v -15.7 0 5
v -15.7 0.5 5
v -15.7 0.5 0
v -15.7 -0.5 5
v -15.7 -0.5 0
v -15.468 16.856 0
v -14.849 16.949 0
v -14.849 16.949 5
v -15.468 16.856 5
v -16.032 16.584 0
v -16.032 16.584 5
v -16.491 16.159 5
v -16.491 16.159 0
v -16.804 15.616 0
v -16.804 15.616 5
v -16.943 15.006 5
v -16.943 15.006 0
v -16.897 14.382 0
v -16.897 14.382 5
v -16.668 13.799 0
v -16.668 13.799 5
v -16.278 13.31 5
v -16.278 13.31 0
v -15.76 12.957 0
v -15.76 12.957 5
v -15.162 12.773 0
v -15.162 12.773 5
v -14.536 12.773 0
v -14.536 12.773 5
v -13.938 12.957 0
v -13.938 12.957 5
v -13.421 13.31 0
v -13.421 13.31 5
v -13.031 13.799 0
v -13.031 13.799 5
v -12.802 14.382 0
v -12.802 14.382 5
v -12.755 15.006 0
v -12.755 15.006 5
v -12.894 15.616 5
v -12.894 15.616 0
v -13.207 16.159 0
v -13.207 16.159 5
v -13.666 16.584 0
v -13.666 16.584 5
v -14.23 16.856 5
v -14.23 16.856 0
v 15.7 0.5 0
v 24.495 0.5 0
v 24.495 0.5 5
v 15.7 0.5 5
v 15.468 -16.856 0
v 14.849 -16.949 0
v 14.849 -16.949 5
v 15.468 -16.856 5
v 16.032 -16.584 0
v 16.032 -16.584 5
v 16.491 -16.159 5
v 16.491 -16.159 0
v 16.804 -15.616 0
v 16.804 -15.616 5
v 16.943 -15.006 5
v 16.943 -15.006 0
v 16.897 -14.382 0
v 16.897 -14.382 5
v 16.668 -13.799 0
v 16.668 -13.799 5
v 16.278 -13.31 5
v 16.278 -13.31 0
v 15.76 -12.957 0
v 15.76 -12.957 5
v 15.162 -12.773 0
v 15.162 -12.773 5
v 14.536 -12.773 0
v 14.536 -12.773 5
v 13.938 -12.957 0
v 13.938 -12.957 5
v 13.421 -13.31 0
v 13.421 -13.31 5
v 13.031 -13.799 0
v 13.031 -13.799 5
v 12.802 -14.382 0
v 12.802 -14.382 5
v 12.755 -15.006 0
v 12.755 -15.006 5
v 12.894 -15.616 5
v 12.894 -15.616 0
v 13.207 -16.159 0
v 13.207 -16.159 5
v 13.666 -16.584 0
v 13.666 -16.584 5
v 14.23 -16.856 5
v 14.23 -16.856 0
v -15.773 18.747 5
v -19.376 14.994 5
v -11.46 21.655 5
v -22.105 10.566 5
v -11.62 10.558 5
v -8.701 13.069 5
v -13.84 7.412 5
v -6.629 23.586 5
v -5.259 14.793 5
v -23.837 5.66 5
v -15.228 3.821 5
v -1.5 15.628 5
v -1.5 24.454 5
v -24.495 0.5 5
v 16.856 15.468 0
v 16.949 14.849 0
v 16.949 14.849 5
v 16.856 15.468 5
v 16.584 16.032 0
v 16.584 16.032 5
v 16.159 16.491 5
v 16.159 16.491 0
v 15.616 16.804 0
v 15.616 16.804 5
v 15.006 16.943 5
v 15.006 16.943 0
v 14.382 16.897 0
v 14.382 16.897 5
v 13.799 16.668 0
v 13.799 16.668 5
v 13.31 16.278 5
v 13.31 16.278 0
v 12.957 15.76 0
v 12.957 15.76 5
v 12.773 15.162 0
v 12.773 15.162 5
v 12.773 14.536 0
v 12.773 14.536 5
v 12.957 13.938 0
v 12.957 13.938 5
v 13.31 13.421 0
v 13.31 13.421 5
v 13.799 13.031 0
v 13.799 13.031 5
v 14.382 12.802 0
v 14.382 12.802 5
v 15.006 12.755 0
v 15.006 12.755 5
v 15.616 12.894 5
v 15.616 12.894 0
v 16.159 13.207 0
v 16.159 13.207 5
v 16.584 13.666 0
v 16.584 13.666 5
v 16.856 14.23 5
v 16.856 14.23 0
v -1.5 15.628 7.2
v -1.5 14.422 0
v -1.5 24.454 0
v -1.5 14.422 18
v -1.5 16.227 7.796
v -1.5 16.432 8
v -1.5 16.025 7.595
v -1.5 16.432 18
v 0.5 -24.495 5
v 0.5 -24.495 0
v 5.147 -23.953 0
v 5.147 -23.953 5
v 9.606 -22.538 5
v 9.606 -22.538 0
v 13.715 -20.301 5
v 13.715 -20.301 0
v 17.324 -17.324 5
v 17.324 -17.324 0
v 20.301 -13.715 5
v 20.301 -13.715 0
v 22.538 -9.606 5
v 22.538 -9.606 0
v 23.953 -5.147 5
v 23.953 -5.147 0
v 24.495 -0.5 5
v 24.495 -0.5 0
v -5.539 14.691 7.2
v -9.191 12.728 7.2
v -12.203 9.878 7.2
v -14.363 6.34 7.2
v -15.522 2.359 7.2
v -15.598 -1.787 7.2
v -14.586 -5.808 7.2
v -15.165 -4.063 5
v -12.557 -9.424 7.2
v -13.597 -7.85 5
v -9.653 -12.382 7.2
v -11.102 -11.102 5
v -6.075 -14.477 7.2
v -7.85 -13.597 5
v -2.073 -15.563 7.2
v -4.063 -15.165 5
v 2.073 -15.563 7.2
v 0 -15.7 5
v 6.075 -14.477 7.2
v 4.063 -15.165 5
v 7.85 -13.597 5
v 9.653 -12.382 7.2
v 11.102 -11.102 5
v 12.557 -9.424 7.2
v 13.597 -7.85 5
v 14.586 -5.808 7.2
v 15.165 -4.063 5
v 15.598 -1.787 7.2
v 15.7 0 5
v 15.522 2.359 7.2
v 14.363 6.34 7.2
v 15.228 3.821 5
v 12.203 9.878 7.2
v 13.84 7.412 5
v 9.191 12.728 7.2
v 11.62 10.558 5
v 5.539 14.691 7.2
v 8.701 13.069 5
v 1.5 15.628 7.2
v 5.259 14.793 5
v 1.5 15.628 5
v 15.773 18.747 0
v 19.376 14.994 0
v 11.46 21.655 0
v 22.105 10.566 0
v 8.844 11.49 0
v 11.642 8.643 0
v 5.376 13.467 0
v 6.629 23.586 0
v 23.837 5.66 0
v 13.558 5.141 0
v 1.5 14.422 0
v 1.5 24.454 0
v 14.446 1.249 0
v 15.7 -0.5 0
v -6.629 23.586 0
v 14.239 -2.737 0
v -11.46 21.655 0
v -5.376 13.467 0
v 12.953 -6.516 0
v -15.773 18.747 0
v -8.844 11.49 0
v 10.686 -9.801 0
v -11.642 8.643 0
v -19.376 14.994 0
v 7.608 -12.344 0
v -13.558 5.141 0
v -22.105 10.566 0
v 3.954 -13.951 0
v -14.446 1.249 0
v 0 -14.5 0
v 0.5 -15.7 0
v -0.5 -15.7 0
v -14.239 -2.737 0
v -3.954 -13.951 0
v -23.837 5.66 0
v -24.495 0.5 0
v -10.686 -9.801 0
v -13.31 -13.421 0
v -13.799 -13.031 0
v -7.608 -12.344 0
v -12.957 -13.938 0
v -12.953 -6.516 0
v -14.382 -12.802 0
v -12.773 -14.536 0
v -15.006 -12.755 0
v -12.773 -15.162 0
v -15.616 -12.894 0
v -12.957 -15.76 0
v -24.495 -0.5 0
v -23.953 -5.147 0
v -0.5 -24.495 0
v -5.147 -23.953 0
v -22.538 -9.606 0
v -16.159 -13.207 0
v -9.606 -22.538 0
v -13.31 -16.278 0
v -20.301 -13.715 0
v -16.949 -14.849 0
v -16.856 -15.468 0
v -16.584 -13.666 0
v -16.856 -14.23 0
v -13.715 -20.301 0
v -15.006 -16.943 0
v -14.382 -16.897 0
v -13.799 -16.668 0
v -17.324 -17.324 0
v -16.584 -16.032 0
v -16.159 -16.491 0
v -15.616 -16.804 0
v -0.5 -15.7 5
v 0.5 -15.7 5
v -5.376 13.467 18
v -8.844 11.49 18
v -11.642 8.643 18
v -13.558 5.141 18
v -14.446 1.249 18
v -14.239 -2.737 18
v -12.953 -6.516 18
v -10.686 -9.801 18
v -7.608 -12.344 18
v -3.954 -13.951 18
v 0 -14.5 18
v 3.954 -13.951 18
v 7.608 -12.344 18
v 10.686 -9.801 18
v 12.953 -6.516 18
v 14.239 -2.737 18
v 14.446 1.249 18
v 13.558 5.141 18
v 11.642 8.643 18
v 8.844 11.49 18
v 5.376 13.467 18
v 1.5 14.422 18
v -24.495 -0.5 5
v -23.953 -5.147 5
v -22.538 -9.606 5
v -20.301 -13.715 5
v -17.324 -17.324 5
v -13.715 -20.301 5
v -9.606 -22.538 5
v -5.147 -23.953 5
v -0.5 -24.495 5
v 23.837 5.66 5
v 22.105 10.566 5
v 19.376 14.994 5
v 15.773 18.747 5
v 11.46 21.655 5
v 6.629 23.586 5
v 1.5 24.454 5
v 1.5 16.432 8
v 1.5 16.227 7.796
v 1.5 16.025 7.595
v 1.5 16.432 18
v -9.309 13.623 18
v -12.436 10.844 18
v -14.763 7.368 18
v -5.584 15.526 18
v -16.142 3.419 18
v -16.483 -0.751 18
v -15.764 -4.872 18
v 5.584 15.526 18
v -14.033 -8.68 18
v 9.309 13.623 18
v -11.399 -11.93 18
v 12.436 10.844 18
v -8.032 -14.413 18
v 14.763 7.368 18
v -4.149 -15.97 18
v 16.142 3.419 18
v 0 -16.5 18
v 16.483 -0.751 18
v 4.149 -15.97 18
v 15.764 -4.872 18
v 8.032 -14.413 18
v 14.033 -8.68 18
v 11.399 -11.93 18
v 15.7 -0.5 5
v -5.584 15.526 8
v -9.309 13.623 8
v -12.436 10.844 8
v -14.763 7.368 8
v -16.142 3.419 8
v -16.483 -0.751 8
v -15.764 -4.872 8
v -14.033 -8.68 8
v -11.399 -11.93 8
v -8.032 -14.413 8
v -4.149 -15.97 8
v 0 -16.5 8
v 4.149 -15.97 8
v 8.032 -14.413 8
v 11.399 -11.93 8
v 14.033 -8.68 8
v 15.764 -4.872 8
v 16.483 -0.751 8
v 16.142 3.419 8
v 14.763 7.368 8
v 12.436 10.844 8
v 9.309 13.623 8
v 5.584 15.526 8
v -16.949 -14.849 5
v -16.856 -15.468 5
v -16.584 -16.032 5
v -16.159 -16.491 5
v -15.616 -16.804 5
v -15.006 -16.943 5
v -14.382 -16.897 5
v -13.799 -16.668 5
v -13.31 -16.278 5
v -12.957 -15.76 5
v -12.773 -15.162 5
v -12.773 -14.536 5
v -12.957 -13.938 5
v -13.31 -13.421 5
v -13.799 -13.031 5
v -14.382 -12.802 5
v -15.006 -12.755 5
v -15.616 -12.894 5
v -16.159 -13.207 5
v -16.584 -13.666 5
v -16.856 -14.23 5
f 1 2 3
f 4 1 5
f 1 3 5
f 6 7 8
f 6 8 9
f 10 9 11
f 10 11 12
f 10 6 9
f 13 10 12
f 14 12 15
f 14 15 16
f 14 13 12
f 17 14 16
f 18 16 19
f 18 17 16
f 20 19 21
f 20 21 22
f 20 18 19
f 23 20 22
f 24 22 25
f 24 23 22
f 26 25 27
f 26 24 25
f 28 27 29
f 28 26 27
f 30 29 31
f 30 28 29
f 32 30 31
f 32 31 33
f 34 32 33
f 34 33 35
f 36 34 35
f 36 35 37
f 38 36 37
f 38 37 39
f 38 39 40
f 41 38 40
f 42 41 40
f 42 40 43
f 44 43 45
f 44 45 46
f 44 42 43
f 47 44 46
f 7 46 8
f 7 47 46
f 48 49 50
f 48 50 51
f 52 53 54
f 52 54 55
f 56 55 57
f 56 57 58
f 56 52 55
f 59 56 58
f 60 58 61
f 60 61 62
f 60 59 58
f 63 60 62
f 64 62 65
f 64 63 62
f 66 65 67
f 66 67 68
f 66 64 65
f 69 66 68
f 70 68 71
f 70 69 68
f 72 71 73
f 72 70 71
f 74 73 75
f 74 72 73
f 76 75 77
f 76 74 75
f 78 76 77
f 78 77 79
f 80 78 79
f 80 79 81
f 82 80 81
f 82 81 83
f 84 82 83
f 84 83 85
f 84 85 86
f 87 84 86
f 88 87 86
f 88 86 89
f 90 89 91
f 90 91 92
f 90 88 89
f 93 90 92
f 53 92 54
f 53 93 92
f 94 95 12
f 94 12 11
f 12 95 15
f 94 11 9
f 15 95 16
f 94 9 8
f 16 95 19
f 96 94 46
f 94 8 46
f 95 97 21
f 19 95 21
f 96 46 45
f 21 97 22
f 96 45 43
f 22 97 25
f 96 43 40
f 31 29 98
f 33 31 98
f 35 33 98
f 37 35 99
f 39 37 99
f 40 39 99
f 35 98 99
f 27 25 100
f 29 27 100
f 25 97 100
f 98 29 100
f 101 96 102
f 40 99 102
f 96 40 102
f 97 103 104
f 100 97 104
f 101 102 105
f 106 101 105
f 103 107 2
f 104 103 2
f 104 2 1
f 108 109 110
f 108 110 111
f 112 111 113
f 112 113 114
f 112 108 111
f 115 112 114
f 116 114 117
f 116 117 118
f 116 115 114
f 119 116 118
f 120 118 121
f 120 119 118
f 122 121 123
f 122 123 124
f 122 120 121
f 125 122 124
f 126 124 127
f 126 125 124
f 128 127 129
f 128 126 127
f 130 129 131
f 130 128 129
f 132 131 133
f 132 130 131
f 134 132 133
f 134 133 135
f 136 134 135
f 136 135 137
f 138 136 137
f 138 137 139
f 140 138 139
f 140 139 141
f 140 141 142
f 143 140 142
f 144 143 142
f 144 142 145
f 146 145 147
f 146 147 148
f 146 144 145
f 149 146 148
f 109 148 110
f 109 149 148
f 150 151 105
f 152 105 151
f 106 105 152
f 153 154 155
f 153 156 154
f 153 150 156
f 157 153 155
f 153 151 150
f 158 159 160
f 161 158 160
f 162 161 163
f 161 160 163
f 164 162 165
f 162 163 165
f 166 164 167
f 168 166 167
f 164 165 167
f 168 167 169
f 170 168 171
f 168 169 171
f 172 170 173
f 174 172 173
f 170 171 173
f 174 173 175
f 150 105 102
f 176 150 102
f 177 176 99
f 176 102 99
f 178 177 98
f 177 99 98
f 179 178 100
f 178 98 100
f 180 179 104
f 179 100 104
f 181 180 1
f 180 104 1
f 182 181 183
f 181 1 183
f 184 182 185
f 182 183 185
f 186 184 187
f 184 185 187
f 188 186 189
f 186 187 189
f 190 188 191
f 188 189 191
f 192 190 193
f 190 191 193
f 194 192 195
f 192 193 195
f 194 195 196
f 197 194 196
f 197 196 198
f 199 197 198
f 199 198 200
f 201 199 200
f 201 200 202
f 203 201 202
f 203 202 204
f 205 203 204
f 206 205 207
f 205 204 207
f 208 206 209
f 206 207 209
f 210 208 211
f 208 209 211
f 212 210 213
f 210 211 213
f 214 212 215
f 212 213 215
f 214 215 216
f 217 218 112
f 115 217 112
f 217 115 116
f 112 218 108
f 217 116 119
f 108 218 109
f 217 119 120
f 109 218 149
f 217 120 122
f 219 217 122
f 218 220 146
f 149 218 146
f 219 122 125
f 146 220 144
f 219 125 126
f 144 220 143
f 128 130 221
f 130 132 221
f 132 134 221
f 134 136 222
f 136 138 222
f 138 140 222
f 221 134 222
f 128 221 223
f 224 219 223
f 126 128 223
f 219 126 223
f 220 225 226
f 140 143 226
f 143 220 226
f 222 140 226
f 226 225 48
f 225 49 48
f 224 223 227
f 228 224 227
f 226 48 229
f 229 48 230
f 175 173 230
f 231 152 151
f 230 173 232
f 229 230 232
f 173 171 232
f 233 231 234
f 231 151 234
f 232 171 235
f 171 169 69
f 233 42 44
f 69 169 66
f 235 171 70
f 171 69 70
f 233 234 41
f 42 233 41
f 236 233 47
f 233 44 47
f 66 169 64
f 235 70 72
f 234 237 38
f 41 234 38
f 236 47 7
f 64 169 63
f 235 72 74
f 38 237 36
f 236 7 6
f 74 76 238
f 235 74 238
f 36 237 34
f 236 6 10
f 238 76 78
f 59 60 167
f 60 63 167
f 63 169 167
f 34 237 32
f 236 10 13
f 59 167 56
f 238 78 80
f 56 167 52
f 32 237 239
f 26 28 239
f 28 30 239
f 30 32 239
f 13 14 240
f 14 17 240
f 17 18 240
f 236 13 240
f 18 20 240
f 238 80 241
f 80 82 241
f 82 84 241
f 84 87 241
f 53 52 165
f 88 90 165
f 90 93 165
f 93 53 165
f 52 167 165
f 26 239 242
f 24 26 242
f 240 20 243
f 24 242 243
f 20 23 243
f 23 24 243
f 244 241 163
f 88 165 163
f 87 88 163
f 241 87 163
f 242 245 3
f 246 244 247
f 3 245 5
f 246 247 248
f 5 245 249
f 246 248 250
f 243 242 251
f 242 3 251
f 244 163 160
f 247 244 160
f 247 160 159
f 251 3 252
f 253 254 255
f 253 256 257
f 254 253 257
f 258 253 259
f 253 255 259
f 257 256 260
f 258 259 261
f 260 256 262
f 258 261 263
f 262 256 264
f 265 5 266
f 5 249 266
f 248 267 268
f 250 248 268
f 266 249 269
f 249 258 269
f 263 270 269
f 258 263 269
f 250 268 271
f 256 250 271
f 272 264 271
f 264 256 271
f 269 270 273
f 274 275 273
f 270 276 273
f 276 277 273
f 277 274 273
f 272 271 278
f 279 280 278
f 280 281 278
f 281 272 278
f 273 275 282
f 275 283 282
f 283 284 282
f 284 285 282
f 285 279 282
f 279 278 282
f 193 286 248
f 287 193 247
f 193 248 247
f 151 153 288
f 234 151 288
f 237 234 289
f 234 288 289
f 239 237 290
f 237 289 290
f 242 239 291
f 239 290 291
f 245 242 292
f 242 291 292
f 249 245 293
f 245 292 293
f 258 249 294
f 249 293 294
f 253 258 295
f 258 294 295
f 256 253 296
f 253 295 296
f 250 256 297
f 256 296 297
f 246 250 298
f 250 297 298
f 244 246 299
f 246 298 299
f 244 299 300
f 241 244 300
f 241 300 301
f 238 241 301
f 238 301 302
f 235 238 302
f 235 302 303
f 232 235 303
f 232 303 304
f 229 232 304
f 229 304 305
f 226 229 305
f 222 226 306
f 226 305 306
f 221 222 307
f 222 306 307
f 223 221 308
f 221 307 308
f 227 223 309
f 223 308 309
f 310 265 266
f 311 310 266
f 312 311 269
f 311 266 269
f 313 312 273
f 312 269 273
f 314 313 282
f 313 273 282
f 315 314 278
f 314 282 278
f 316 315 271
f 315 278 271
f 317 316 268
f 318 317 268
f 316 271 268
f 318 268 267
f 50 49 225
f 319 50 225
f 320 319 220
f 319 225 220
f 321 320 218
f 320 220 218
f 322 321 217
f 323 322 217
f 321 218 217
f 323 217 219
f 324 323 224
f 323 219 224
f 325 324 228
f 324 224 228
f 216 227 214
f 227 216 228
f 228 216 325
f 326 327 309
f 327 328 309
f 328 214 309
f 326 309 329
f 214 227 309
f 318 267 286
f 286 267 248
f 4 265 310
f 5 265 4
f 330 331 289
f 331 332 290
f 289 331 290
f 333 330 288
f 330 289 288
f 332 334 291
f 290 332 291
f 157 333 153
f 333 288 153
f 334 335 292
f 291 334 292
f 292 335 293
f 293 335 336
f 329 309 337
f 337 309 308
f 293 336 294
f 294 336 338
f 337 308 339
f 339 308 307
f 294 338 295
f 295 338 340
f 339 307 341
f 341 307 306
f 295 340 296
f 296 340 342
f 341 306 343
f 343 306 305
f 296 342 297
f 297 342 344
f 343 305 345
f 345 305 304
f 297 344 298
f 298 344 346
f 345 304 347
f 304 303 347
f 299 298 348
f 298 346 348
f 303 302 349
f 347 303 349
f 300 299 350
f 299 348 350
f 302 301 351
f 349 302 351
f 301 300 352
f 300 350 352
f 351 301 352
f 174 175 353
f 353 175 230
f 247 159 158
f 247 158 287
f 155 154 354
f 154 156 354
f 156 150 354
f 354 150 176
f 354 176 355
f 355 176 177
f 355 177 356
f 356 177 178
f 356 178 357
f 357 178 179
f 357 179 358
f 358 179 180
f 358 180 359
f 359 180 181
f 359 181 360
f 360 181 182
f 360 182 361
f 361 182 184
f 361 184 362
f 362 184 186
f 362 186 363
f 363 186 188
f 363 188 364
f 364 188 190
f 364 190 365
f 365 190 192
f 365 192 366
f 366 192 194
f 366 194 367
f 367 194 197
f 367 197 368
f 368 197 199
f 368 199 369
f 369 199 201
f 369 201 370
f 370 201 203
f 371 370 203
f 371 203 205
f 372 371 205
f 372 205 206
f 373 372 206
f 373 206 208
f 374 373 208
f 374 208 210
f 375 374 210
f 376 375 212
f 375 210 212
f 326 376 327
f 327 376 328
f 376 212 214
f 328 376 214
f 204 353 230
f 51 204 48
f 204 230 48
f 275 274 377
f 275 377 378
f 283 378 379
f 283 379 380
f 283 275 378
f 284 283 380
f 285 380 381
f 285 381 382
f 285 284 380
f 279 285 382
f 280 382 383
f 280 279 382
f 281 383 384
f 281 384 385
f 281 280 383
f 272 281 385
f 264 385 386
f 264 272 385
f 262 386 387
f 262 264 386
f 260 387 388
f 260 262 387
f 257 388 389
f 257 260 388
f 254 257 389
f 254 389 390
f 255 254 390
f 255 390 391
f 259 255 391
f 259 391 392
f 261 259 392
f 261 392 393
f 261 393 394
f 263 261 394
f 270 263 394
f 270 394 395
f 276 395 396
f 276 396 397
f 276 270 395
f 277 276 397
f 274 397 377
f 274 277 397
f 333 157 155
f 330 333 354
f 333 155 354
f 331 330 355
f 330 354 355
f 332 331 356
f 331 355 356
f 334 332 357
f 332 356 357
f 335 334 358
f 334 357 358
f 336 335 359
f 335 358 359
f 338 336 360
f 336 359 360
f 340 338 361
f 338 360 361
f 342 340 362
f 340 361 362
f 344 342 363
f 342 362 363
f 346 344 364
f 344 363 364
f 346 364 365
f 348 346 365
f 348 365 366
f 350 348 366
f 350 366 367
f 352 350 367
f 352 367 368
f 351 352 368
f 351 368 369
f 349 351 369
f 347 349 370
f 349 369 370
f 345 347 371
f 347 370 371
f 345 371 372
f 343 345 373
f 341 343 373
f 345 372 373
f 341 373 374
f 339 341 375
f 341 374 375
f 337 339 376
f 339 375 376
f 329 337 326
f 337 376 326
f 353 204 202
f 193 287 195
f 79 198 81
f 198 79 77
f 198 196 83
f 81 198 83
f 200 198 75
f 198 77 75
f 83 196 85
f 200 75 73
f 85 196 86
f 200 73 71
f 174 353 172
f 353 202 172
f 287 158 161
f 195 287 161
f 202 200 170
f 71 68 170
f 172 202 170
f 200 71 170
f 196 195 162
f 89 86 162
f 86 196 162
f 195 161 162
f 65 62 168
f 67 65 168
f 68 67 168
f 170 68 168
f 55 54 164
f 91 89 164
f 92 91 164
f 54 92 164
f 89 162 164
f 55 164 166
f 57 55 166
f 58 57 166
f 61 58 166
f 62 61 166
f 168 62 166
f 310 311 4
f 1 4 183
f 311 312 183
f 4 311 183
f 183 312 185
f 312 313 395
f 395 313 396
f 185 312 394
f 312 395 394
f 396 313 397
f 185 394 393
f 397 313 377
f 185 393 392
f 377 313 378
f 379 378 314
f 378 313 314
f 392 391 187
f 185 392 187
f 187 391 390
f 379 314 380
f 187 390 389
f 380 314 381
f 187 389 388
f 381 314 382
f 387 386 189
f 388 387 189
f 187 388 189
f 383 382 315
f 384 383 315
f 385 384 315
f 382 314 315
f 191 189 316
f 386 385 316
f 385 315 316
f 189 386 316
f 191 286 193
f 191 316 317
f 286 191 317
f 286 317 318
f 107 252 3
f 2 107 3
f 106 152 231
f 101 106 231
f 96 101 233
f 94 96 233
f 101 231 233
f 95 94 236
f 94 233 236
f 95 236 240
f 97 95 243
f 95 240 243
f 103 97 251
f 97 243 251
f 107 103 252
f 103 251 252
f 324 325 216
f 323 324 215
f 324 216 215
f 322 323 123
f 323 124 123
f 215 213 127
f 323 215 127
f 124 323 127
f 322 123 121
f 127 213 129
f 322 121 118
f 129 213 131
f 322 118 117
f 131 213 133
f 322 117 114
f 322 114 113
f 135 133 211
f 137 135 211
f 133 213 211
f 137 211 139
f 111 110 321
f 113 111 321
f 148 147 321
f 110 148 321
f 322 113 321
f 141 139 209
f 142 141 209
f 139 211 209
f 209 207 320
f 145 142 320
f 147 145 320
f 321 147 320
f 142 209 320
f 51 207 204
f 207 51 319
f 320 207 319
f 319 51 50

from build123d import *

# Parameters (mm, degrees)
SKETCH001_W           = 3
SKETCH001_H           = 12
POCKET_DEPTH          = 18.001
SKETCH002_W           = 1
SKETCH002_H           = 8.8
POCKET001_DEPTH       = 5
POLARPATTERN_COUNT    = 4
SKETCH003_R           = 2.1
POCKET002_DEPTH       = 5
POLARPATTERN001_COUNT = 4


with BuildPart() as part:
    # Sketch → Revolution (revolve)
    with BuildSketch(Plane.XZ):
        Polygon((-14.5, 0), (-14.5, 18), (-16.5, 18), (-16.5, 8), (-15.7, 7.2), (-15.7, 5), (-24.5, 5), (-24.5, 0), align=None)
    revolve(axis=Axis((0, 0, 0), (0, 0, 1)))

    # Sketch001 → Pocket (cut, through all)
    with BuildSketch(Plane.XY.offset(18)):
        with Locations((0, 19.5)):
            Rectangle(SKETCH001_W, SKETCH001_H)
    extrude(amount=-POCKET_DEPTH, mode=Mode.SUBTRACT)

    # Sketch002 → Pocket001 (cut)
    with BuildSketch(Plane.XY):
        with Locations((0, -20.1)):
            Rectangle(SKETCH002_W, SKETCH002_H)
    pocket001 = extrude(amount=POCKET001_DEPTH, mode=Mode.SUBTRACT)

    # PolarPattern: Pocket001 ×4 about axis
    polarpattern_axis = Axis((0, 0, 0), (0, 0, 1))
    for i in range(1, POLARPATTERN_COUNT):
        add(pocket001.rotate(polarpattern_axis, i * 360 / POLARPATTERN_COUNT), mode=Mode.SUBTRACT)

    # Sketch003 → Pocket002 (cut)
    with BuildSketch(Plane.XY):
        with Locations((14.849242, 14.849242)):
            Circle(SKETCH003_R)
    pocket002 = extrude(amount=POCKET002_DEPTH, mode=Mode.SUBTRACT)

    # PolarPattern001: Pocket002 ×4 about axis
    polarpattern001_axis = Axis((0, 0, 0), (0, 0, 1))
    for i in range(1, POLARPATTERN001_COUNT):
        add(pocket002.rotate(polarpattern001_axis, i * 360 / POLARPATTERN001_COUNT), mode=Mode.SUBTRACT)


solid = part.part
